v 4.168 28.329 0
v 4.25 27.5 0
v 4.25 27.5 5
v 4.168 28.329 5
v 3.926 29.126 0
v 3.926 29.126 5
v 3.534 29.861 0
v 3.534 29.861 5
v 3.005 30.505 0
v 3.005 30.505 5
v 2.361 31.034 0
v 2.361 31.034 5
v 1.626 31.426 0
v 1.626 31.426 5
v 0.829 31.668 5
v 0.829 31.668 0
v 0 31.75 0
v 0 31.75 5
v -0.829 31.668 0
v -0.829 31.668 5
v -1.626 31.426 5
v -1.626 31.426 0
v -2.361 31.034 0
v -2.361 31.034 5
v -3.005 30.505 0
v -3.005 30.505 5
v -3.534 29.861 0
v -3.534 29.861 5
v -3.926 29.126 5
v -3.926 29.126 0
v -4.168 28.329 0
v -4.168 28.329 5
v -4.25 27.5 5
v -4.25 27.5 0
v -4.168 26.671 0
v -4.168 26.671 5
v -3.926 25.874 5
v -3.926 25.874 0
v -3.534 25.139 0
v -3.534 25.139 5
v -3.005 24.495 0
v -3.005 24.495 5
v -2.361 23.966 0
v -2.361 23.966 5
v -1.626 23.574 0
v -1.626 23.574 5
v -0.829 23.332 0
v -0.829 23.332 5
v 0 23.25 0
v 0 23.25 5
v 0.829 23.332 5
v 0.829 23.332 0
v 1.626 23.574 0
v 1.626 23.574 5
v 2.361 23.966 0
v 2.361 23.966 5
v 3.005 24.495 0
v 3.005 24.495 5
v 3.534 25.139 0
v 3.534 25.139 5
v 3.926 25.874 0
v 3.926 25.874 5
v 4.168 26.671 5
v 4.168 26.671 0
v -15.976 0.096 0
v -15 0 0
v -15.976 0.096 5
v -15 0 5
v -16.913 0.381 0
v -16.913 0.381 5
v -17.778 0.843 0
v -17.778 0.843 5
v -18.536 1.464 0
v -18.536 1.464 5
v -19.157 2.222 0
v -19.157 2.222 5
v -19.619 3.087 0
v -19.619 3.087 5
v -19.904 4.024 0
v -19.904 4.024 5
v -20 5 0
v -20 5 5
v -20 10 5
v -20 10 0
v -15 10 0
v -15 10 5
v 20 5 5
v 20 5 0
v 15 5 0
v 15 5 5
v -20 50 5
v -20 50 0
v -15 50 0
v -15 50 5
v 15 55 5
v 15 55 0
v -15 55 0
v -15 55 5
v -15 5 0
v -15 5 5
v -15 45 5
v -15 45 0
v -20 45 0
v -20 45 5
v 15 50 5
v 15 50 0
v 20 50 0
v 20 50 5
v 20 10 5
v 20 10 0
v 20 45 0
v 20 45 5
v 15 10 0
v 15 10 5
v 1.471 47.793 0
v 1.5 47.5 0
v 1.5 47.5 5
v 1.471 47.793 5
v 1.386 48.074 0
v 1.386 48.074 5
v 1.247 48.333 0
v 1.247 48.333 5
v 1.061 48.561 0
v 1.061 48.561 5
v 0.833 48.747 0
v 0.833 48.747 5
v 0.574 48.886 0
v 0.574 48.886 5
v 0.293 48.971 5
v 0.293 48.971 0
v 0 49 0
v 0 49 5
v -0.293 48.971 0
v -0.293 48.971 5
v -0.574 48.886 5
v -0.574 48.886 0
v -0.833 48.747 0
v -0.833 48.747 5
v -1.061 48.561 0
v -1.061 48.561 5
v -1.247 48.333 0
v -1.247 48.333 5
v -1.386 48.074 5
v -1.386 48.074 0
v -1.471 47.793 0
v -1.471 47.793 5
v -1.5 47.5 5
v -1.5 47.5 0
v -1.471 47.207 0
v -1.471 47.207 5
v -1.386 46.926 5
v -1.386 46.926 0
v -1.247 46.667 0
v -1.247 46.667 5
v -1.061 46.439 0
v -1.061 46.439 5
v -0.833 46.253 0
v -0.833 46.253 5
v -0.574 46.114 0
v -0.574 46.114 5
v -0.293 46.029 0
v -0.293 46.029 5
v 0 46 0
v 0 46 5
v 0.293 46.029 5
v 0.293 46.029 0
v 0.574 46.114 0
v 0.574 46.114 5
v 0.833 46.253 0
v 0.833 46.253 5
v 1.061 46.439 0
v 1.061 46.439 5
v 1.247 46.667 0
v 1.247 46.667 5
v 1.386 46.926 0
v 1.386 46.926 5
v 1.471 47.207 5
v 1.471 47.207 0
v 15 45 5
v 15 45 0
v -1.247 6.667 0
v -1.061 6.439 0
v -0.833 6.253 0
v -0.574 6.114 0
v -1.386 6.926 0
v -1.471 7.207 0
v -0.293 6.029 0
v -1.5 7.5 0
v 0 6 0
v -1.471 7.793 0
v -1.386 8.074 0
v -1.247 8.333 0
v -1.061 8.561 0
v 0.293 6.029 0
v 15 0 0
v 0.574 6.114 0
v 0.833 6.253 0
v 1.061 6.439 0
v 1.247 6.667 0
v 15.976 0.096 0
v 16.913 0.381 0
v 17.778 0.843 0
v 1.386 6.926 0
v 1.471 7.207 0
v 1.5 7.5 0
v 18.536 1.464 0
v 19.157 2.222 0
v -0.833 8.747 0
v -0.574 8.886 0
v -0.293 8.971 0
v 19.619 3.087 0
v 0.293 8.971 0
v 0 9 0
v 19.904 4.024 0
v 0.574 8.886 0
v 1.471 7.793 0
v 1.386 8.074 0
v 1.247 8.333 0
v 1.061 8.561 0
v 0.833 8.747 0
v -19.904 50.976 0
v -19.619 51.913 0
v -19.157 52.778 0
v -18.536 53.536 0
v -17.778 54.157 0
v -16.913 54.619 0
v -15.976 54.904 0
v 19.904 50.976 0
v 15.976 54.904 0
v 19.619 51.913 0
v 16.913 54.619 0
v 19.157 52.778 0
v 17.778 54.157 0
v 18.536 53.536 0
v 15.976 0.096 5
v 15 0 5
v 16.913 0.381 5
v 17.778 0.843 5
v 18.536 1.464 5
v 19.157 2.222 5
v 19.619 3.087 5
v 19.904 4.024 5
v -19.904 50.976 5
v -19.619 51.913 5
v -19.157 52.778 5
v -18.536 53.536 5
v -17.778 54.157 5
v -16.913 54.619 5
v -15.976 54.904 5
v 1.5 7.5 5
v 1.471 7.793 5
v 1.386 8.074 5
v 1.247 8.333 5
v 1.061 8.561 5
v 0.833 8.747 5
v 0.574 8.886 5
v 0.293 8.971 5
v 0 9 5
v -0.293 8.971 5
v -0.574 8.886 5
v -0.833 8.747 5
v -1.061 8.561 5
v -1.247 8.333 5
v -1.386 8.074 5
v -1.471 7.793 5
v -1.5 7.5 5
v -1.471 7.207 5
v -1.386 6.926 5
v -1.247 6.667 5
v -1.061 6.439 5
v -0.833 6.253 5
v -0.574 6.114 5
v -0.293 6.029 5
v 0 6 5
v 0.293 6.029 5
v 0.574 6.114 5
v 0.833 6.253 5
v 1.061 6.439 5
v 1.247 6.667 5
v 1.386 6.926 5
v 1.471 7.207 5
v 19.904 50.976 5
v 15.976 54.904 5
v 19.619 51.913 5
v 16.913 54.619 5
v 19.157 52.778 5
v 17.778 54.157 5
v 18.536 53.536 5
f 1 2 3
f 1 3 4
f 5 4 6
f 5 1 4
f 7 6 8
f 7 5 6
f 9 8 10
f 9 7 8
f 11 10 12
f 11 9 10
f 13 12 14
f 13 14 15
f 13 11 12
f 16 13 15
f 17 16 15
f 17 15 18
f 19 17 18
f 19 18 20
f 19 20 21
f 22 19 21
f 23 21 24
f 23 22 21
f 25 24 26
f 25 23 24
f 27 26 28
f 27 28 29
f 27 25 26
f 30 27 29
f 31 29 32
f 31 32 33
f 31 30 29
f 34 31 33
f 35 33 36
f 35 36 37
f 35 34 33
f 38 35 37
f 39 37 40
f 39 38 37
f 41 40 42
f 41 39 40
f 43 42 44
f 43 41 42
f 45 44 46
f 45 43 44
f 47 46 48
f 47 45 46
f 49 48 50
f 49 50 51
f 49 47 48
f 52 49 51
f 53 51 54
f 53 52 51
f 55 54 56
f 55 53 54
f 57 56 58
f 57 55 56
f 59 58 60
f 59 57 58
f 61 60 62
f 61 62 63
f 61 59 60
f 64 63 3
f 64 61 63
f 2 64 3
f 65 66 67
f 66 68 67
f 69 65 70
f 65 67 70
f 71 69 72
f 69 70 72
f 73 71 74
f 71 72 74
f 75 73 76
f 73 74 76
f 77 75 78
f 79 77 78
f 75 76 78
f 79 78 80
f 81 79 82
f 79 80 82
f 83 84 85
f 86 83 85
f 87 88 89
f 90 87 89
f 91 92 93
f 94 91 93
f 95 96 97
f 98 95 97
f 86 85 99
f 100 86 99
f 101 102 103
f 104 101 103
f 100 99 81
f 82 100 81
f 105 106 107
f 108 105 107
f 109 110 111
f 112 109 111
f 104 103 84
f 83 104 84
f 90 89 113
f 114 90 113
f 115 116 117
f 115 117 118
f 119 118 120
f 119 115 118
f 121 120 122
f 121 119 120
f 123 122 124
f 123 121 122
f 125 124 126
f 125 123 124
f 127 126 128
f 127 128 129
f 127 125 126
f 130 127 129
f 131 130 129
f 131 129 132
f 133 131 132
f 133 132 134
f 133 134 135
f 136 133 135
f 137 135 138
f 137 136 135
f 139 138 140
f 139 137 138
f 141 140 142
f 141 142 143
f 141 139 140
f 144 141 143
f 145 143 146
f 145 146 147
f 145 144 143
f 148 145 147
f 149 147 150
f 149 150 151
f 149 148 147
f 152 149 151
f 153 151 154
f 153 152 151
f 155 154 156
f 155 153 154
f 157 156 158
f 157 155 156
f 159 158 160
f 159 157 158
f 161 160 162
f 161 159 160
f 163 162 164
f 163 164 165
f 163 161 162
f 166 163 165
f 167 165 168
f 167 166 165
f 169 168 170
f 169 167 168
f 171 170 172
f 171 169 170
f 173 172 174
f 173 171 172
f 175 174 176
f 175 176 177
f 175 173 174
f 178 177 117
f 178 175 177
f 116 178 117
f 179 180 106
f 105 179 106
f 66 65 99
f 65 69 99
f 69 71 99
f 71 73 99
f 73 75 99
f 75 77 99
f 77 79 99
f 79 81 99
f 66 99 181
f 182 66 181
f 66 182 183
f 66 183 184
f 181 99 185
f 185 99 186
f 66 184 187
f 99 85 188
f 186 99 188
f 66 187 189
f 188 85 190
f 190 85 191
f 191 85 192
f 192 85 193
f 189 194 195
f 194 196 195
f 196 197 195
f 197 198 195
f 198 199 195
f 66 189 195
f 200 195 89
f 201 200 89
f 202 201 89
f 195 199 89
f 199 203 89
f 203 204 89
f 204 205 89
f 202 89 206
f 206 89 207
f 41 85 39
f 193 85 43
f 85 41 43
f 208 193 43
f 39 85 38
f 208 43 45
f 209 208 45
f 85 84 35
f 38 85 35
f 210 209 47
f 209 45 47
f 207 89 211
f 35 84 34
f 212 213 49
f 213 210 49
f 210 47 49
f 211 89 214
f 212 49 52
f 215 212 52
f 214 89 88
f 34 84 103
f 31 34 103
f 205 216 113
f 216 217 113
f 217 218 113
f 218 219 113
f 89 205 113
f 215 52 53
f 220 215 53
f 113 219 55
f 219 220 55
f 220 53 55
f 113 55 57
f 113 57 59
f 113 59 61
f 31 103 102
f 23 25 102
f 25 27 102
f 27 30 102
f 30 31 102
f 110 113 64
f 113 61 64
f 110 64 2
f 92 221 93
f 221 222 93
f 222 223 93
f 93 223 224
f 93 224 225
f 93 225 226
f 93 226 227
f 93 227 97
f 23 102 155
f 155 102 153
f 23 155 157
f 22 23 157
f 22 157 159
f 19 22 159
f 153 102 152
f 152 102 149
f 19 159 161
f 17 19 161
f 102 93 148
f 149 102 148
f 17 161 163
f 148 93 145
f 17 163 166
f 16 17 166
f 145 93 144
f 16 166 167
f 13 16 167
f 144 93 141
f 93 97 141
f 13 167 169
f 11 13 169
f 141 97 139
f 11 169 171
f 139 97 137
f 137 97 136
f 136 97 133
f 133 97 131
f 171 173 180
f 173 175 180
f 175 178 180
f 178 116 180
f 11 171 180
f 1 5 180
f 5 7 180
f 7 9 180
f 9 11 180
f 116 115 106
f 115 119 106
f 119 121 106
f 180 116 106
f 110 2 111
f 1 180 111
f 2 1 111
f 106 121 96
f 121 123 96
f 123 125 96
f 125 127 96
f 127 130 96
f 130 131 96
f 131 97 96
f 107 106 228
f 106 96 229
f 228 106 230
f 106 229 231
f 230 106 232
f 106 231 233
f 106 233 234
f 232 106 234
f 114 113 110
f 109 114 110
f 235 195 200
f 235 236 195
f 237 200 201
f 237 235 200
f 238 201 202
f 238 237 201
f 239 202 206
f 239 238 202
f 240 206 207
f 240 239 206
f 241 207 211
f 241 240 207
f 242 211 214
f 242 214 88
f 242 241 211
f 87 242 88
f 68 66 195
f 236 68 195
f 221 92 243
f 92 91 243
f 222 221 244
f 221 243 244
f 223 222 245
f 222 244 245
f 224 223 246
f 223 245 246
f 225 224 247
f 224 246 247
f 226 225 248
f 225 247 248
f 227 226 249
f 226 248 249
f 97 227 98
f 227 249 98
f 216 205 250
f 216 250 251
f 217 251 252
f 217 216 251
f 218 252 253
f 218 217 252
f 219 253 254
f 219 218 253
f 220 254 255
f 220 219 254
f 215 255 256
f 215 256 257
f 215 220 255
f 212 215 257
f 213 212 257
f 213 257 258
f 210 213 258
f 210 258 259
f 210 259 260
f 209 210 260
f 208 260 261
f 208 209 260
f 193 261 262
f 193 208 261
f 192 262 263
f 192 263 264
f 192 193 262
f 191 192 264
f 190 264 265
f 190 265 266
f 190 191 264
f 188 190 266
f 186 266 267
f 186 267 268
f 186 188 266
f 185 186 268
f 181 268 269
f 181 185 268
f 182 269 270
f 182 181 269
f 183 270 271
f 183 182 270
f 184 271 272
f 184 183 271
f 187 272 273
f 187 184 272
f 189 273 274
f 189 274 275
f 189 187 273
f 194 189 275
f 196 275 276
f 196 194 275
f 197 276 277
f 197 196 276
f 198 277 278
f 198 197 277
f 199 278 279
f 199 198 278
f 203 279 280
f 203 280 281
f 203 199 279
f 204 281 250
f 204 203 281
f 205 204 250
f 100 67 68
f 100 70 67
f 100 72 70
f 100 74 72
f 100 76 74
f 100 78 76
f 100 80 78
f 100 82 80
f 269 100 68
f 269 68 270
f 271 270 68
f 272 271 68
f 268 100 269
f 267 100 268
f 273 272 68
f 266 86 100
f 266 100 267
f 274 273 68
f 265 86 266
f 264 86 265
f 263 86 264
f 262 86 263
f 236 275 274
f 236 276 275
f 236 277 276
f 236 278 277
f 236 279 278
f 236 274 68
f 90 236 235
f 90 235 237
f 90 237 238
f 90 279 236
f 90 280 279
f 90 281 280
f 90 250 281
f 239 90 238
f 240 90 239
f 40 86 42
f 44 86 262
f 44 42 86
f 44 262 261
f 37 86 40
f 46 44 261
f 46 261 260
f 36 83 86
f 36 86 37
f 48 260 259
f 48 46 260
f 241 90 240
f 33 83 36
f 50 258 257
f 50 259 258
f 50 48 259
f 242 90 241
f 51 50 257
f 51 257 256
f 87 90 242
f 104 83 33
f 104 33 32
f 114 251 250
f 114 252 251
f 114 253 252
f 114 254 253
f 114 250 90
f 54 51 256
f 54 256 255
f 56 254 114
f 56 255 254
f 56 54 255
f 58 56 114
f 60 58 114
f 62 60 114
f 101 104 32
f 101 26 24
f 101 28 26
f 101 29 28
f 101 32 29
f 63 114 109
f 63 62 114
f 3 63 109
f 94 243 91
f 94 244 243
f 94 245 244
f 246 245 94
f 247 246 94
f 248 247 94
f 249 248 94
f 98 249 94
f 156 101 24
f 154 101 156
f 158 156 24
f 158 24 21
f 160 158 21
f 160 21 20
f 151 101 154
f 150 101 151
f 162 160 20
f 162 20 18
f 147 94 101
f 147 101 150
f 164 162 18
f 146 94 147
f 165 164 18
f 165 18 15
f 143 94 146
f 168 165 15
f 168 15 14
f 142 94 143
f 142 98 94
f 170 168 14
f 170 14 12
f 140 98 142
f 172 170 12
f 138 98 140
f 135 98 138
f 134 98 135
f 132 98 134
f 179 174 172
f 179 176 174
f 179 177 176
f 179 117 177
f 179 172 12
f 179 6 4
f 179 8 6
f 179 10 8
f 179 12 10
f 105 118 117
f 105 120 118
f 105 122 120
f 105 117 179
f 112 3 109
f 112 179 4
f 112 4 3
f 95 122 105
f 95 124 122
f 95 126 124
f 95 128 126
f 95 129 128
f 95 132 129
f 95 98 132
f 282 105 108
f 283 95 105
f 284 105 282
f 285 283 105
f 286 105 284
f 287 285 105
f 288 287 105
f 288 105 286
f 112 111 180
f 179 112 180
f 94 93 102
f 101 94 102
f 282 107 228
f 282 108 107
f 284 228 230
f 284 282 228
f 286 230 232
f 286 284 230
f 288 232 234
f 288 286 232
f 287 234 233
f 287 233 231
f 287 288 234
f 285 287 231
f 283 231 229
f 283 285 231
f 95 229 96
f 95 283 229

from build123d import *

# Parameters (mm, degrees)
ESQUISSE1_R        = 1.5
ESQUISSE1_R_2      = 4.25
BOSS_EXTRU_1_DEPTH = 5
CONG_1_R           = 5


with BuildPart() as part:
    # Esquisse1 → Boss.-Extru.1 (new body)
    with BuildSketch(Plane.XY):
        Polygon((-20, 0), (20, 0), (20, 5), (15, 5), (15, 10), (20, 10), (20, 45), (15, 45), (15, 50), (20, 50), (20, 55), (-20, 55), (-20, 50), (-15, 50), (-15, 45), (-20, 45), (-20, 10), (-15, 10), (-15, 5), (-20, 5), align=None)
        with Locations((0, 47.5)):
            Circle(ESQUISSE1_R, mode=Mode.SUBTRACT)
        with Locations((0, 7.5)):
            Circle(ESQUISSE1_R, mode=Mode.SUBTRACT)
        with Locations((0, 27.5)):
            Circle(ESQUISSE1_R_2, mode=Mode.SUBTRACT)
    extrude(amount=BOSS_EXTRU_1_DEPTH)

    # Congé1
    cong_1_edges = [part.edges().sort_by_distance(p)[0] for p in [
        (20, 55, 2.5),
        (20, 0, 2.5),
        (-20, 0, 2.5),
        (-20, 55, 2.5),
    ]]
    fillet(cong_1_edges, radius=CONG_1_R - 0.0001)  # a hair under: the kernel refuses the full size


solid = part.part
